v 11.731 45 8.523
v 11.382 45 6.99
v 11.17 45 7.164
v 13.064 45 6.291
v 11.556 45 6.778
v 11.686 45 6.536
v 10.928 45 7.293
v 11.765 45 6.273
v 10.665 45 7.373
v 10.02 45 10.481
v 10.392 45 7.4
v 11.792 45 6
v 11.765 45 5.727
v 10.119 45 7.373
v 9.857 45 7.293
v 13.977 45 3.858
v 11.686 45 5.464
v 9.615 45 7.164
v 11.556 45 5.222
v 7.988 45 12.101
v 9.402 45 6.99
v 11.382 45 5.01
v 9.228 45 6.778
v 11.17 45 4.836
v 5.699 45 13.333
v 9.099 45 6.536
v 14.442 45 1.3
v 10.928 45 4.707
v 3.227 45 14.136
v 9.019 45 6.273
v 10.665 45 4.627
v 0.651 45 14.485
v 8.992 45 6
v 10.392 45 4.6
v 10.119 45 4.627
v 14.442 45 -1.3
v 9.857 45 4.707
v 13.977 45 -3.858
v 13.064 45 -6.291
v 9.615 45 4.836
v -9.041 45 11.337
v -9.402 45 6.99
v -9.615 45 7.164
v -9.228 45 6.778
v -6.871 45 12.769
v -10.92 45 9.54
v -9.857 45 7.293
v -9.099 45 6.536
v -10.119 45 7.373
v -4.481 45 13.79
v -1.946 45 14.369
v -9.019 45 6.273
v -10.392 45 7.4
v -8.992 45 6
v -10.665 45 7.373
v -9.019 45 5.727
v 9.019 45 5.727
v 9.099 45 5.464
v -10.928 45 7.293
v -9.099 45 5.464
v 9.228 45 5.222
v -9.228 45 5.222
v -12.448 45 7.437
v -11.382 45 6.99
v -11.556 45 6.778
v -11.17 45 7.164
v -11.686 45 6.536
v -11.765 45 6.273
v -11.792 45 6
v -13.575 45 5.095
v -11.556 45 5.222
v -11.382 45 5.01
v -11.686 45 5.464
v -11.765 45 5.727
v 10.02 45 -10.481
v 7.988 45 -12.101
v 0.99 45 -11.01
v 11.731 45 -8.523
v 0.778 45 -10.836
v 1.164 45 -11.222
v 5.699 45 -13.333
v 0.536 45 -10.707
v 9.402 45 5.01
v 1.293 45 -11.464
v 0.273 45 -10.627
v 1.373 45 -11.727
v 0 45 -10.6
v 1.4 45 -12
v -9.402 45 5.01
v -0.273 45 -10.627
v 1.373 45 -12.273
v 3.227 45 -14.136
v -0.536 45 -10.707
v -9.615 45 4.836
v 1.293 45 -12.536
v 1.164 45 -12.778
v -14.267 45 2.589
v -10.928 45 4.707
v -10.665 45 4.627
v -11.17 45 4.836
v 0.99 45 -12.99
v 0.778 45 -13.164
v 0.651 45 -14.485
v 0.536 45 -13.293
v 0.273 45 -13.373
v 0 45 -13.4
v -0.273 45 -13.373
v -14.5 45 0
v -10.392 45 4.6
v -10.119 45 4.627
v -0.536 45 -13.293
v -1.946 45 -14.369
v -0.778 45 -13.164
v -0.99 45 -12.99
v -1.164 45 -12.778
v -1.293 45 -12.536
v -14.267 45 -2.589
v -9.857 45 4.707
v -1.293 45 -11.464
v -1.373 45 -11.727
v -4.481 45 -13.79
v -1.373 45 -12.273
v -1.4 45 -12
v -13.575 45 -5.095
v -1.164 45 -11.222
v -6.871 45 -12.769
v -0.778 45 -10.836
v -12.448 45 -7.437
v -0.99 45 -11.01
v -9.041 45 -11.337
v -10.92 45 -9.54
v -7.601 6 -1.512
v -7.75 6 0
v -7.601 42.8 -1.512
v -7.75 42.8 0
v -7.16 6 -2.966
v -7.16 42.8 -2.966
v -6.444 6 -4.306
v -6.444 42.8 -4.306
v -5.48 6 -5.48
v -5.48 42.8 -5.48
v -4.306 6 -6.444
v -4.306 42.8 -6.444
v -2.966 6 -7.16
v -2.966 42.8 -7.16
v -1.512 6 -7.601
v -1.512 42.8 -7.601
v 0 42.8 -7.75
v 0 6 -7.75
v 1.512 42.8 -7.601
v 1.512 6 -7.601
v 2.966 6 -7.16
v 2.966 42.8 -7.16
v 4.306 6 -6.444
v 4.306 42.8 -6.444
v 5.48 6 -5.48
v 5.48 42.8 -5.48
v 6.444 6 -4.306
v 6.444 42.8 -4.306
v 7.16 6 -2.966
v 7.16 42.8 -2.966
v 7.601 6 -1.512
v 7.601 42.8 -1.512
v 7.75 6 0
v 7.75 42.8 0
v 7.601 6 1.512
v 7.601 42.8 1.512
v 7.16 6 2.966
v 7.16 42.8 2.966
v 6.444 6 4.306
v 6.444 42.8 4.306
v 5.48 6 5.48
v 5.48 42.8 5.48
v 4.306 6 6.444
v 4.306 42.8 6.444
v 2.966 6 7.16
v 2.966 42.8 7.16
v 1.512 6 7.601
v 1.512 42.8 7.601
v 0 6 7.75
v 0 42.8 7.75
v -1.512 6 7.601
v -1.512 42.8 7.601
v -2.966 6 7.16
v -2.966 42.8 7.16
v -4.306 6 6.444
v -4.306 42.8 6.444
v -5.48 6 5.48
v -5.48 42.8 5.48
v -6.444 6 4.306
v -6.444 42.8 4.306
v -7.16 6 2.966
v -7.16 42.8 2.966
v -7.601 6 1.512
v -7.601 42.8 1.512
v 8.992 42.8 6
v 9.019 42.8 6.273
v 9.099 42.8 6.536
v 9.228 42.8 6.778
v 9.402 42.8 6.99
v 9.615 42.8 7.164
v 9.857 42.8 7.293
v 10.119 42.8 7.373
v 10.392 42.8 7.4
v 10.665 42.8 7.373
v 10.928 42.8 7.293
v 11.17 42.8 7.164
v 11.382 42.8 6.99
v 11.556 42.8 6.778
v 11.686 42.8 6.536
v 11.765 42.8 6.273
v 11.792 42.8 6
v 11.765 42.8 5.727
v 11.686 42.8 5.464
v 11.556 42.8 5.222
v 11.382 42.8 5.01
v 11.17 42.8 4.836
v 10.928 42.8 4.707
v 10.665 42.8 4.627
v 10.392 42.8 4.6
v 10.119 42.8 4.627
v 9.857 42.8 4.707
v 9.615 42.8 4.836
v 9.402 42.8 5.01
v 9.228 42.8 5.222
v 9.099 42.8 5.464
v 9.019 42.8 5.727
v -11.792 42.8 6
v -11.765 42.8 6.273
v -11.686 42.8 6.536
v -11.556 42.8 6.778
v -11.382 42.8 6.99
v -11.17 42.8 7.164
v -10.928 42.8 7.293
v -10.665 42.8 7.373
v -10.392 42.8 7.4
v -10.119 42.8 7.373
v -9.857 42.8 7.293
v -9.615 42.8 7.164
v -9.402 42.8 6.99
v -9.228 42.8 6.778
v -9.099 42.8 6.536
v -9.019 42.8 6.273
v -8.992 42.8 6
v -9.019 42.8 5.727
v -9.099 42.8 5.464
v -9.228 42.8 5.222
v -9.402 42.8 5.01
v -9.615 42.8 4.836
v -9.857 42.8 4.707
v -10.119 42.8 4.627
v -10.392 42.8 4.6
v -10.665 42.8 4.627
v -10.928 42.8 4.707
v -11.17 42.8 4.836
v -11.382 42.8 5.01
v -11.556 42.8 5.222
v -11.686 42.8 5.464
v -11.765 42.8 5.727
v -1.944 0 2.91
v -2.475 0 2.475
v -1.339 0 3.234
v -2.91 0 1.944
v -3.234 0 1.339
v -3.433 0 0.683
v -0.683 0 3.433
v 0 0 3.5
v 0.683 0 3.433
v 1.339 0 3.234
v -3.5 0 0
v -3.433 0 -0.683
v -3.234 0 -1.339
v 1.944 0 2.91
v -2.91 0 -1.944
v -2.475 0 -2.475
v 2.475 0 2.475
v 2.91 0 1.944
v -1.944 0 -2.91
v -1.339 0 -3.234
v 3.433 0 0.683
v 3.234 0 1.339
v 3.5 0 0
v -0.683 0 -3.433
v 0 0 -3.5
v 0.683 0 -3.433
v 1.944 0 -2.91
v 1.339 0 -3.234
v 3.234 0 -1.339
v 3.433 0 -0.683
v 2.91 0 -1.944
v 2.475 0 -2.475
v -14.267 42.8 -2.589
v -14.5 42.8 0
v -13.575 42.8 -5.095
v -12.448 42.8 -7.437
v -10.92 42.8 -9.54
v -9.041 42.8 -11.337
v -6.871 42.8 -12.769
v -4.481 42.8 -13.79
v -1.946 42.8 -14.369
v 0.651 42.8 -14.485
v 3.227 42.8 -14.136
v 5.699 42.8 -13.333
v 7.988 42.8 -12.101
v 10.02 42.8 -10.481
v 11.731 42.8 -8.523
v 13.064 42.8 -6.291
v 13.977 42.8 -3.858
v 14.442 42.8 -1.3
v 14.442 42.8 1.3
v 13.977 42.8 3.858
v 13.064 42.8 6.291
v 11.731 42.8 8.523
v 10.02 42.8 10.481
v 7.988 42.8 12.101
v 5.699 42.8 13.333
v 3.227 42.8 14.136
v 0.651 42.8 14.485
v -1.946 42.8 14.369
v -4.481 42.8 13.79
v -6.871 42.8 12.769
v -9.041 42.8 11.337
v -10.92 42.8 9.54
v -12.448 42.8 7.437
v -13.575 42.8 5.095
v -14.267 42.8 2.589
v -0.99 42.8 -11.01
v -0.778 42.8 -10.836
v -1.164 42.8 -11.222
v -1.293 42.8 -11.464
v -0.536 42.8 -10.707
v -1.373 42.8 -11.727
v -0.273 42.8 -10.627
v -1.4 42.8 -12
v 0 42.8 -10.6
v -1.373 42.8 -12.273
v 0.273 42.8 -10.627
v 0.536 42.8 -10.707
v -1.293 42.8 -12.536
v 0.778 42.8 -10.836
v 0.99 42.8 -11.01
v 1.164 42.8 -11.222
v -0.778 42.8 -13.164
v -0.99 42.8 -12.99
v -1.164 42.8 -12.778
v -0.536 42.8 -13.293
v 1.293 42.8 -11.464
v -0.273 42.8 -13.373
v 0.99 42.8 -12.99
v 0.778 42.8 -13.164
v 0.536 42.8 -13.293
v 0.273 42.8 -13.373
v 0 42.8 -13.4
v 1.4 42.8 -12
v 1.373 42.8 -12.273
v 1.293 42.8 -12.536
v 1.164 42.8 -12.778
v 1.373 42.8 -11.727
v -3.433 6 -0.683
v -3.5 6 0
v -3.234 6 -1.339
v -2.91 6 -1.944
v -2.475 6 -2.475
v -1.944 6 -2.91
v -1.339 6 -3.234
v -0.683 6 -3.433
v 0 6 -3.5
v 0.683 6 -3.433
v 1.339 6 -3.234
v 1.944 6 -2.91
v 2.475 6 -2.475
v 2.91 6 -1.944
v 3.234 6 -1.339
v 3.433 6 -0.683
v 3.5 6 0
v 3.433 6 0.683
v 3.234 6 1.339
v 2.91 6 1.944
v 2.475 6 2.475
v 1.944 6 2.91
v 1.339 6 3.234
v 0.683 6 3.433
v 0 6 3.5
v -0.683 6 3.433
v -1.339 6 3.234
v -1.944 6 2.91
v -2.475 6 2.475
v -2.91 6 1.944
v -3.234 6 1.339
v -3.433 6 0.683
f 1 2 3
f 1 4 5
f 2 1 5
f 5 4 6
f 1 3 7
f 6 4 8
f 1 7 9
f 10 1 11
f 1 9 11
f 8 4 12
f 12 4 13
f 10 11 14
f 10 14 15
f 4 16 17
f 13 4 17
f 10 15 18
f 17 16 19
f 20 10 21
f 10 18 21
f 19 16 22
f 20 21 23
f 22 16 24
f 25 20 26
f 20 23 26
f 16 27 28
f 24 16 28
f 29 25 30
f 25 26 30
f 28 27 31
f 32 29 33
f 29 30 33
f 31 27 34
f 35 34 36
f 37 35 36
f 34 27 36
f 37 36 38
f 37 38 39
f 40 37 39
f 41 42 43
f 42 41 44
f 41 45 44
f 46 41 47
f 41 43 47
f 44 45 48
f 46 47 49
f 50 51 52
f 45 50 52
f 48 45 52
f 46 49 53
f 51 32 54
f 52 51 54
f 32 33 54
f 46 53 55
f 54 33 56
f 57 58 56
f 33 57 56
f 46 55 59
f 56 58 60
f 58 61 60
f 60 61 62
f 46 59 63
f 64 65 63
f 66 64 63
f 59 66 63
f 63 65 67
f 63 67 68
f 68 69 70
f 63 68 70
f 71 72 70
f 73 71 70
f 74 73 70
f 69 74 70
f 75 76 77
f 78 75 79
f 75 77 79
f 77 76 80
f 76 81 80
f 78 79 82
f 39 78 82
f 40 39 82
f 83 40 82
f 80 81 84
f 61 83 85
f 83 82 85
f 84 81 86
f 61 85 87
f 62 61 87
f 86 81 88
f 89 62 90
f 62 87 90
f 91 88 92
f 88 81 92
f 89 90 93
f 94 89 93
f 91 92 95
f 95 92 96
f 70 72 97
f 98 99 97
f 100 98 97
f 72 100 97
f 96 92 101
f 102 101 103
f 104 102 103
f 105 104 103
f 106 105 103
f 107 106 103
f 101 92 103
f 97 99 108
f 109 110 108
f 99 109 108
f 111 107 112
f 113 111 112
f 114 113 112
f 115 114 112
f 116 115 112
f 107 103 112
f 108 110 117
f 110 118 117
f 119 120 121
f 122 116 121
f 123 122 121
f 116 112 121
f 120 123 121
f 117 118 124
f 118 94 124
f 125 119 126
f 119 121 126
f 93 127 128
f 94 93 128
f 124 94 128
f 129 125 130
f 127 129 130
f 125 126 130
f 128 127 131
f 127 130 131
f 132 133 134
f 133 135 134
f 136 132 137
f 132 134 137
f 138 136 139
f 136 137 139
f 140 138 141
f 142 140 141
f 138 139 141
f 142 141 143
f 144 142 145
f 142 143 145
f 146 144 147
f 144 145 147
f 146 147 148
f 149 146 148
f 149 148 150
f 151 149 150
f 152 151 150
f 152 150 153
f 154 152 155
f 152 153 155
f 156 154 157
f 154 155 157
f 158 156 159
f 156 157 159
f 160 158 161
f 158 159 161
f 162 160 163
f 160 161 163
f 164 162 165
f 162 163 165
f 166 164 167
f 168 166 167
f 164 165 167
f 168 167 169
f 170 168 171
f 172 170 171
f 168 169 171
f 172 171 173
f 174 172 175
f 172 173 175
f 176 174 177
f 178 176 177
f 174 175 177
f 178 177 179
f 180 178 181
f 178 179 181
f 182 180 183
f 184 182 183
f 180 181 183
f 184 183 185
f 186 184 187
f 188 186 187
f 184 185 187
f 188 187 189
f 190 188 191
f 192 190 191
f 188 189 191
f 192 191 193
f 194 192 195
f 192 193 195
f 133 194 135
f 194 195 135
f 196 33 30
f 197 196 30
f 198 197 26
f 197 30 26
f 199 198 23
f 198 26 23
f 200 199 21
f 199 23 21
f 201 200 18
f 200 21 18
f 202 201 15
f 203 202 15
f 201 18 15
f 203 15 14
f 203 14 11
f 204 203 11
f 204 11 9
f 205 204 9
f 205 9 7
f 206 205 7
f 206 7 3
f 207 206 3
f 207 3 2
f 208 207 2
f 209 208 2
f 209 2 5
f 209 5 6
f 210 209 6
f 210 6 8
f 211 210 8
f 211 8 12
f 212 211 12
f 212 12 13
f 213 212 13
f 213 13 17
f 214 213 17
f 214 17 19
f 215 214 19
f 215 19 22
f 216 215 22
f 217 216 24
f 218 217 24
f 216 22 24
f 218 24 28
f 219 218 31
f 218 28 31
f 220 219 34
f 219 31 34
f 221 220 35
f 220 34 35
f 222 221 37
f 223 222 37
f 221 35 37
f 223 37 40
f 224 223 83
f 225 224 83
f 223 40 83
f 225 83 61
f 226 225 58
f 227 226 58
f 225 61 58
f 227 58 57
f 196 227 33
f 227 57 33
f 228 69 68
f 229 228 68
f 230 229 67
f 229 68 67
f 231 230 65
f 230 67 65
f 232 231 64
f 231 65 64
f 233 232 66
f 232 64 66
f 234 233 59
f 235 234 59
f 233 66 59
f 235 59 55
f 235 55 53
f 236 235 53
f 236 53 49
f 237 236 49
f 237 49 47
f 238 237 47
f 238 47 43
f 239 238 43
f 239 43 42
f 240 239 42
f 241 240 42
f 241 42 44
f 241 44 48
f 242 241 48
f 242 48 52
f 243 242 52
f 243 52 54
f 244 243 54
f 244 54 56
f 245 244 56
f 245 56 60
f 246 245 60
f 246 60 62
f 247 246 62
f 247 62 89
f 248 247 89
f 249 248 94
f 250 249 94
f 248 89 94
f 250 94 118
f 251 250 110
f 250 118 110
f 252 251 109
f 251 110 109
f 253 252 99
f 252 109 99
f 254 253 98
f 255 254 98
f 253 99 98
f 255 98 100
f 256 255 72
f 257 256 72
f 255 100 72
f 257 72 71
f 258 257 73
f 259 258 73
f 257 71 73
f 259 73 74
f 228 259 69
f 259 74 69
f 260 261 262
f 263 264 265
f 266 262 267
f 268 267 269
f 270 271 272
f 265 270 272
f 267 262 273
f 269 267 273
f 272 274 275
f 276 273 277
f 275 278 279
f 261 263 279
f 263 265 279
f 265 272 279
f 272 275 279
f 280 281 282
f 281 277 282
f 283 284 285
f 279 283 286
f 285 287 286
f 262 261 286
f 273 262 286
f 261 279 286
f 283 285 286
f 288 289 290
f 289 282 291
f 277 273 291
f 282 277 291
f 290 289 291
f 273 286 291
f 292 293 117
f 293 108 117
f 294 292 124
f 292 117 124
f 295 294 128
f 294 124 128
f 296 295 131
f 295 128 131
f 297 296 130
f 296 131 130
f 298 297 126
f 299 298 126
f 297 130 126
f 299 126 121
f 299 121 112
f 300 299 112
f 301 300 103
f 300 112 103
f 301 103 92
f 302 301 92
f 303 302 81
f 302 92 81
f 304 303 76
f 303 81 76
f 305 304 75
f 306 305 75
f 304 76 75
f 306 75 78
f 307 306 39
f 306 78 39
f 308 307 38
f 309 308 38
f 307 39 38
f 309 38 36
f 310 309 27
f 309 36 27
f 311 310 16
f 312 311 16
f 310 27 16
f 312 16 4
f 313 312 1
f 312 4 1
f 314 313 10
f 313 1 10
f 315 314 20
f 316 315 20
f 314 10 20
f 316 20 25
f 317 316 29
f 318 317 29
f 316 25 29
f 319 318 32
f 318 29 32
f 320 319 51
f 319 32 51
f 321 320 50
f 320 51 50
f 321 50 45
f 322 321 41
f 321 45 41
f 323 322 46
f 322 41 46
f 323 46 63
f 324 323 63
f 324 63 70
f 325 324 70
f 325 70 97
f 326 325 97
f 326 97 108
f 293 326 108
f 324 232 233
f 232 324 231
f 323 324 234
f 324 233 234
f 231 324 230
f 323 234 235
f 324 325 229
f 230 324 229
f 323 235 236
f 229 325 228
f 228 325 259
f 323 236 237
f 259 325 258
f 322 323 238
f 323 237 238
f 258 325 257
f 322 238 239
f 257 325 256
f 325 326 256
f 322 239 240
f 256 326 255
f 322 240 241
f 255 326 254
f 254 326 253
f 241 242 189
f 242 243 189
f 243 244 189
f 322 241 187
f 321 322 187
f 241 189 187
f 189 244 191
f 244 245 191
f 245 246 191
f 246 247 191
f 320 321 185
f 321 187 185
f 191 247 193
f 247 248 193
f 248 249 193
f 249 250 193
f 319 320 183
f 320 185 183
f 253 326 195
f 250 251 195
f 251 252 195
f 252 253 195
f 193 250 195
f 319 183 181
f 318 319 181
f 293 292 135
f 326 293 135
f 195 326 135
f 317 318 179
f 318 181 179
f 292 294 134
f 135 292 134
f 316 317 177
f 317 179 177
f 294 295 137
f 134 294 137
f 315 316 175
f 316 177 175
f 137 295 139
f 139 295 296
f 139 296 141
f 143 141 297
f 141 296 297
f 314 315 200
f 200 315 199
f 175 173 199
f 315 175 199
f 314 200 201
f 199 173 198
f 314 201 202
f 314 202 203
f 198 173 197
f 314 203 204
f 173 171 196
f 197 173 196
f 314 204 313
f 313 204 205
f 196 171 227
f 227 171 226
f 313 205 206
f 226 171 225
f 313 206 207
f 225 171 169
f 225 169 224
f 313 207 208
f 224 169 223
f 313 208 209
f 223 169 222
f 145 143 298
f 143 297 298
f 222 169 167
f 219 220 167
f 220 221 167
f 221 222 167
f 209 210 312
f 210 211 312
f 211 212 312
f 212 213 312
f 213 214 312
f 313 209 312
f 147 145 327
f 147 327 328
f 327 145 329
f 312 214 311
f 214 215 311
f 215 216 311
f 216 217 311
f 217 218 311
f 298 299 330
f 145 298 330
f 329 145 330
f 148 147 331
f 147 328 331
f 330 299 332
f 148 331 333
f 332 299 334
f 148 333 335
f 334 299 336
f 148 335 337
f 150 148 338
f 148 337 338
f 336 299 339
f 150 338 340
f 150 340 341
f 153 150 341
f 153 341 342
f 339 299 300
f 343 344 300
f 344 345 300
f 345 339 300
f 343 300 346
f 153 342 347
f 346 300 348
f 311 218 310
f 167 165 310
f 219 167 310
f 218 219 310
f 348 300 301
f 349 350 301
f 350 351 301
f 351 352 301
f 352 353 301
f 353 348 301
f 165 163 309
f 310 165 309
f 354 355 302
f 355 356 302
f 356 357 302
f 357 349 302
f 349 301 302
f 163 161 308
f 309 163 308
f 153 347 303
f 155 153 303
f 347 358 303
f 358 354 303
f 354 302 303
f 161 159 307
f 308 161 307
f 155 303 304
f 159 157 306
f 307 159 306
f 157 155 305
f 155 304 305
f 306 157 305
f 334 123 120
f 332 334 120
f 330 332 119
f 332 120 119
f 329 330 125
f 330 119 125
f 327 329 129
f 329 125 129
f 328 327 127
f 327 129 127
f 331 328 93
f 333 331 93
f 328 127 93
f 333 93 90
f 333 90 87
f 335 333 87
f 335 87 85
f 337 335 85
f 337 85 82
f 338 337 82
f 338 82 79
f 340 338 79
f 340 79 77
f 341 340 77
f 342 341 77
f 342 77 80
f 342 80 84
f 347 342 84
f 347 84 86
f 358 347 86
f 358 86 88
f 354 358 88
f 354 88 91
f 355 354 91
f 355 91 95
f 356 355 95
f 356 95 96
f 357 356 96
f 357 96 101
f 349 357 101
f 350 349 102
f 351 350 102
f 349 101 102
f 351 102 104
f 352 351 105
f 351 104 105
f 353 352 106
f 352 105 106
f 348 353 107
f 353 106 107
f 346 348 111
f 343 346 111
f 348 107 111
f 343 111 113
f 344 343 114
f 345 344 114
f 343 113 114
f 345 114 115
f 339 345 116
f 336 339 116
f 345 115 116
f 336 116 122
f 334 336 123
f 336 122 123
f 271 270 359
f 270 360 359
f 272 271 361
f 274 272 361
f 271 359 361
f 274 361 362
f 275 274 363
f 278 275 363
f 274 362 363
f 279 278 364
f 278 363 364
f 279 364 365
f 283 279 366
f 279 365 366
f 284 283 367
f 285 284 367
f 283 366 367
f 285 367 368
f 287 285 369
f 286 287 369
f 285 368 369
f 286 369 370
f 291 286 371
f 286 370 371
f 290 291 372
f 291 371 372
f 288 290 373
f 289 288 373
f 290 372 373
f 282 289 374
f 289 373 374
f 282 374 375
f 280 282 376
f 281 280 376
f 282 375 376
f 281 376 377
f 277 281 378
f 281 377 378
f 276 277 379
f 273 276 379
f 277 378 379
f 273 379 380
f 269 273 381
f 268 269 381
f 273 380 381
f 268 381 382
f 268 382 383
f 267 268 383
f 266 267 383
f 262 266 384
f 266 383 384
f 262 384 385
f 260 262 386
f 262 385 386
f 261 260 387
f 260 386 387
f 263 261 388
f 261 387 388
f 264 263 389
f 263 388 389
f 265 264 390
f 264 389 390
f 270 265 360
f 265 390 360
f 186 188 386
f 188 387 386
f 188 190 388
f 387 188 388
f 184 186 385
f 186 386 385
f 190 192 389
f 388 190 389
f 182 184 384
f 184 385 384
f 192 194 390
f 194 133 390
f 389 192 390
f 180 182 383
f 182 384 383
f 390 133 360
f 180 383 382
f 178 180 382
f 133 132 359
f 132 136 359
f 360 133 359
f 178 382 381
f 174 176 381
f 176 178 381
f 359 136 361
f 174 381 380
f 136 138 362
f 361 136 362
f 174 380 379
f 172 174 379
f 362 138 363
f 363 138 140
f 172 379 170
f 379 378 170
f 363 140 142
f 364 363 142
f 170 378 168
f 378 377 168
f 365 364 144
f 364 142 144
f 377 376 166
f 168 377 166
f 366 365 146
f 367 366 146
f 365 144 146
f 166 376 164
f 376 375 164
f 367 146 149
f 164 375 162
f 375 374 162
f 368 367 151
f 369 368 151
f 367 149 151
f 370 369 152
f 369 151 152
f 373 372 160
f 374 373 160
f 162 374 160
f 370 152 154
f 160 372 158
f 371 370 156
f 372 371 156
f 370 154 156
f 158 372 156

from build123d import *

# Parameters (mm, degrees)
SKETCH_2_R          = 1.4
CUT_EXTRUDE_1_DEPTH = 50.451996926


with BuildPart() as part:
    # 草图1 → 旋转1 (revolve)
    with BuildSketch(Plane.XY):
        Polygon((0, 0), (-3.5, 0), (-3.5, 6), (-7.75, 6), (-7.75, 42.8), (-14.5, 42.8), (-14.5, 45), (0, 45), align=None)
    revolve(axis=Axis((0, 45, 0), (0, -1, 0)))

    # 草图2 → 切除-拉伸1 (cut, through all)
    with BuildSketch(Plane(origin=(0, 45, 0), x_dir=(1, 0, 0), z_dir=(0, 1, 0))):
        with Locations(Location((0, 12, 0), (0, 0, 180))):
            Circle(SKETCH_2_R)
        with Locations(Location((10.392304845, -6, 0), (0, 0, 180))):
            Circle(SKETCH_2_R)
        with Locations(Location((-10.392304845, -6, 0), (0, 0, 180))):
            Circle(SKETCH_2_R)
    extrude(amount=-CUT_EXTRUDE_1_DEPTH, mode=Mode.SUBTRACT)


solid = part.part
